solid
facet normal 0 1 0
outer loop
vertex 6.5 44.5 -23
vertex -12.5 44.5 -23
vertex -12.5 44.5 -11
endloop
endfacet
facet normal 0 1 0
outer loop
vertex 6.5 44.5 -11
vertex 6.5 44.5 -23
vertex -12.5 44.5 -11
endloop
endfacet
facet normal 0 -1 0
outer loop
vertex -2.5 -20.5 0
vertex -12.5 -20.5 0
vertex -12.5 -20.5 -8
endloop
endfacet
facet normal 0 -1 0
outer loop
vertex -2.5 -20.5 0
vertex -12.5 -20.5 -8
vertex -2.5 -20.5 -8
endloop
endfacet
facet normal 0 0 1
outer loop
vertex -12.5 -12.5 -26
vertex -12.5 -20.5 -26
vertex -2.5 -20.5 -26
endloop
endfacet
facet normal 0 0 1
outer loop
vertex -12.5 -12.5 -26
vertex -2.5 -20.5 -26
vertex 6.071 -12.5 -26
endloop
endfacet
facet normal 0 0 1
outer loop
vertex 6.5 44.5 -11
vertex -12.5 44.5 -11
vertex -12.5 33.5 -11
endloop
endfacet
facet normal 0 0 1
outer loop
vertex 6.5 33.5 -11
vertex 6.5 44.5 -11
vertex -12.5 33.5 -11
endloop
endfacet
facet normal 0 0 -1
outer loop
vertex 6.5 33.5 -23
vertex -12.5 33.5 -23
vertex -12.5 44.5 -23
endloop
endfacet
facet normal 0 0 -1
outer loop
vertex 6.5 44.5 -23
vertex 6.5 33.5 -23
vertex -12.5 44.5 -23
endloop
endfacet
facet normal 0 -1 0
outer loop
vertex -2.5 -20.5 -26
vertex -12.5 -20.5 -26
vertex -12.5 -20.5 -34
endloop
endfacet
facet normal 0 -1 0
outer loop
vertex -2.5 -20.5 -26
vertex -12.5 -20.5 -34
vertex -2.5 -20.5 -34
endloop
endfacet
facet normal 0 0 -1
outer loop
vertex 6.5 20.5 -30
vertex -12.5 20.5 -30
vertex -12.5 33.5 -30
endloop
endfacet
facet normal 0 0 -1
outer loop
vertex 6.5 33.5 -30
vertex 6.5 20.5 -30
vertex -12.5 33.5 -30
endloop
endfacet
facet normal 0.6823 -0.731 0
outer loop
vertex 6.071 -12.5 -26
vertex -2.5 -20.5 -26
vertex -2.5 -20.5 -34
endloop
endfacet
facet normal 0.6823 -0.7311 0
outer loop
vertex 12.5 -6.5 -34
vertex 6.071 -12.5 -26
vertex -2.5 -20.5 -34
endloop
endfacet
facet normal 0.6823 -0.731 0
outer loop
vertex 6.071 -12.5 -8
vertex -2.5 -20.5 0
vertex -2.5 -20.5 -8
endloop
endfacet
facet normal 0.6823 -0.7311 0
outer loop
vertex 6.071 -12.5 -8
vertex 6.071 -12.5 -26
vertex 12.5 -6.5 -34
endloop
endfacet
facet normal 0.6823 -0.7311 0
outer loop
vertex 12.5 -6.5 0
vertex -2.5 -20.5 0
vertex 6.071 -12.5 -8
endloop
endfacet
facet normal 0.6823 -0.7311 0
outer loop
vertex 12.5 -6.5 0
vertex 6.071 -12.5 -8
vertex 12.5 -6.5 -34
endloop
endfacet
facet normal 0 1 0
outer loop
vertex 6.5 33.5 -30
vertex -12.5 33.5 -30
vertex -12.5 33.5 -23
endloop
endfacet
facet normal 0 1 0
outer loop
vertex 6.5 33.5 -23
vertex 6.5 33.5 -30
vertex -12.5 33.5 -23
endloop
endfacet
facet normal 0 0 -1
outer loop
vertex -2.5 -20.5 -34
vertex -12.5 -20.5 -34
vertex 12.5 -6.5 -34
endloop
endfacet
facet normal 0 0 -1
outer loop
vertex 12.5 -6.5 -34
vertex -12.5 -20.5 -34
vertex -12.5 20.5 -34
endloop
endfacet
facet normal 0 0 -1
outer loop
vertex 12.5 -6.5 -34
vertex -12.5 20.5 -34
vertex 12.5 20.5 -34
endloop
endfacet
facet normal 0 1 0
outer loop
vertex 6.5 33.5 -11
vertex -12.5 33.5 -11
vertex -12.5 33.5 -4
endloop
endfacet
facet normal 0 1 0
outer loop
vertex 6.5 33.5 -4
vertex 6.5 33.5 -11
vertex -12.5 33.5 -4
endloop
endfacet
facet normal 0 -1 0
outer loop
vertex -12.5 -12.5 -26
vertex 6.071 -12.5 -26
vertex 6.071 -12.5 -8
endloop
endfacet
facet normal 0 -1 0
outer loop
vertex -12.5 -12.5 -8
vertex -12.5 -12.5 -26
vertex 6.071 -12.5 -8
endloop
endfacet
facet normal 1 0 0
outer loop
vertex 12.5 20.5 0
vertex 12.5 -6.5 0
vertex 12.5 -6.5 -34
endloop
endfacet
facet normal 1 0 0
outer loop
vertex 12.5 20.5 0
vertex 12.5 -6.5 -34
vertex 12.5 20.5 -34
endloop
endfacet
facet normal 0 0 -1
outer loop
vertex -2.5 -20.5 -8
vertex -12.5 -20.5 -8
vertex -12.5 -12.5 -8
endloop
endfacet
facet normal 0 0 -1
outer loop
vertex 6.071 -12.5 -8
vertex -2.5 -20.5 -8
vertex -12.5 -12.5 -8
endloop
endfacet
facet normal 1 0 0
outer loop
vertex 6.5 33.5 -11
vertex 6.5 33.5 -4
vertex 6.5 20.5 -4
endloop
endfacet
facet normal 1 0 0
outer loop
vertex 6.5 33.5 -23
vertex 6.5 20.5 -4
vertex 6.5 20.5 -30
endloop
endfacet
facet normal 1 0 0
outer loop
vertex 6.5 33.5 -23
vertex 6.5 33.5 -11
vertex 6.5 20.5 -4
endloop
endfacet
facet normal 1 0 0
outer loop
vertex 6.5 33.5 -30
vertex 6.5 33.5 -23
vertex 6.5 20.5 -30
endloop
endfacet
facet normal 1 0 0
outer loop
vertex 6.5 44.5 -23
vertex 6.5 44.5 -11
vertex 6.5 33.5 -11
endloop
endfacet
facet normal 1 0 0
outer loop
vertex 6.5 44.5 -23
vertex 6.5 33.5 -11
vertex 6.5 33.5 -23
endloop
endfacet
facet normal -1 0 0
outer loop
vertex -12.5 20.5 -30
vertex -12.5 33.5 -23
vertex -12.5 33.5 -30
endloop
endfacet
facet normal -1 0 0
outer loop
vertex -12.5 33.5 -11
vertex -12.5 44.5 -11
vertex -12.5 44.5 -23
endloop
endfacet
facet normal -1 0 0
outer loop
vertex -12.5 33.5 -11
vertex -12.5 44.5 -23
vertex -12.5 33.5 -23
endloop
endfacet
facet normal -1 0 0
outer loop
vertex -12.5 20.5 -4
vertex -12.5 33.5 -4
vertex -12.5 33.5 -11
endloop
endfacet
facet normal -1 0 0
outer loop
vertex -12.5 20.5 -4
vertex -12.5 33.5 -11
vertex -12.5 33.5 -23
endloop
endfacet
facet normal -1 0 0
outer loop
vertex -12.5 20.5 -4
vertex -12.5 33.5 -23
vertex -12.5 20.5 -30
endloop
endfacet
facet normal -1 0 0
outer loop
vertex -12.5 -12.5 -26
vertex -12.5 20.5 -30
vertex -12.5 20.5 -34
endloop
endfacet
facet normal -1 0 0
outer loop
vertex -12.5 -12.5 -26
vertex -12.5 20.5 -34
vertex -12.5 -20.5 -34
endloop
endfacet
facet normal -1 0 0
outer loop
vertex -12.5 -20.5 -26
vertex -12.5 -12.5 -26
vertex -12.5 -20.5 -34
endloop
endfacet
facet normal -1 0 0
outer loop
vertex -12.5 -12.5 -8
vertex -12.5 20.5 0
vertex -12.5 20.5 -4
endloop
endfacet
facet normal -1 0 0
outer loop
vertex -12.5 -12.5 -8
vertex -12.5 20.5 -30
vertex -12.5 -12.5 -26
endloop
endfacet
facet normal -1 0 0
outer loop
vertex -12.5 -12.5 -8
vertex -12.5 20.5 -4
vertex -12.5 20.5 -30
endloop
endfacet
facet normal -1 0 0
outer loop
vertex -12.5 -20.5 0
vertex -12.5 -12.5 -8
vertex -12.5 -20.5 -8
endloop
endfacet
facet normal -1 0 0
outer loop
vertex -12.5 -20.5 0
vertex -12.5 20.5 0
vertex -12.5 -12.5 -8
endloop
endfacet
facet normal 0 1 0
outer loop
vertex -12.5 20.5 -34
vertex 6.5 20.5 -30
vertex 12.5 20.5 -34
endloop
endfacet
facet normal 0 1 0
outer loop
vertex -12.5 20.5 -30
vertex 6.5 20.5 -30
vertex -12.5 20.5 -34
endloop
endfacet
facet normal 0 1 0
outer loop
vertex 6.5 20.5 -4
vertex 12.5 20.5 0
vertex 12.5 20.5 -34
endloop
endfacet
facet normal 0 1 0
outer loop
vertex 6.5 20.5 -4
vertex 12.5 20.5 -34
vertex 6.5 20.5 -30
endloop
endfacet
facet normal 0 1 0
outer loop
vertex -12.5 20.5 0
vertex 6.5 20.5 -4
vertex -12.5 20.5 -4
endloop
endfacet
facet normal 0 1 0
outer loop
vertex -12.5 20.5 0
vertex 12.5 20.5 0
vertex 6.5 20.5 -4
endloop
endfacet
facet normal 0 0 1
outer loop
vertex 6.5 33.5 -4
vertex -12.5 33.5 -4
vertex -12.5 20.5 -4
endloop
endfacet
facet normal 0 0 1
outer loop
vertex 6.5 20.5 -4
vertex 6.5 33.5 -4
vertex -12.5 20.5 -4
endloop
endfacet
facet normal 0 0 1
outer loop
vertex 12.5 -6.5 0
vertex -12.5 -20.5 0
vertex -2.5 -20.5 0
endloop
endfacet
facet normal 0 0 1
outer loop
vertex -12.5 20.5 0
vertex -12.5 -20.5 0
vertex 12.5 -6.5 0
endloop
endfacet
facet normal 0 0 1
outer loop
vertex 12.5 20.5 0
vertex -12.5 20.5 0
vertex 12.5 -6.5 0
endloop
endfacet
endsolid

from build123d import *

# Parameters (mm, degrees)
BOSS_EXTRUDE1_DEPTH = 34
BOSS_EXTRUDE2_DEPTH = 19
SKETCH3_W           = 18
SKETCH3_H           = 8
CUT_EXTRUDE1_DEPTH  = 62.329030646


with BuildPart() as part:
    # Sketch1 → Boss-Extrude1 (new body)
    with BuildSketch(Plane.XY):
        Polygon((-12.5, 20.5), (-12.5, -20.5), (-2.5, -20.5), (12.5, -6.5), (12.5, 20.5), align=None)
    extrude(amount=-BOSS_EXTRUDE1_DEPTH)

    # Sketch2 → Boss-Extrude2 (add)
    with BuildSketch(Plane.ZY.offset(12.5)):
        Polygon((-30, 20.5), (-30, 33.5), (-23, 33.5), (-23, 44.5), (-11, 44.5), (-11, 33.5), (-4, 33.5), (-4, 20.5), align=None)
    extrude(amount=-BOSS_EXTRUDE2_DEPTH)

    # Sketch3 → Cut-Extrude1 (cut, through all)
    with BuildSketch(Plane.ZY.offset(12.5)):
        with Locations((-17, -16.5)):
            Rectangle(SKETCH3_W, SKETCH3_H)
    extrude(amount=-CUT_EXTRUDE1_DEPTH, mode=Mode.SUBTRACT)


solid = part.part
